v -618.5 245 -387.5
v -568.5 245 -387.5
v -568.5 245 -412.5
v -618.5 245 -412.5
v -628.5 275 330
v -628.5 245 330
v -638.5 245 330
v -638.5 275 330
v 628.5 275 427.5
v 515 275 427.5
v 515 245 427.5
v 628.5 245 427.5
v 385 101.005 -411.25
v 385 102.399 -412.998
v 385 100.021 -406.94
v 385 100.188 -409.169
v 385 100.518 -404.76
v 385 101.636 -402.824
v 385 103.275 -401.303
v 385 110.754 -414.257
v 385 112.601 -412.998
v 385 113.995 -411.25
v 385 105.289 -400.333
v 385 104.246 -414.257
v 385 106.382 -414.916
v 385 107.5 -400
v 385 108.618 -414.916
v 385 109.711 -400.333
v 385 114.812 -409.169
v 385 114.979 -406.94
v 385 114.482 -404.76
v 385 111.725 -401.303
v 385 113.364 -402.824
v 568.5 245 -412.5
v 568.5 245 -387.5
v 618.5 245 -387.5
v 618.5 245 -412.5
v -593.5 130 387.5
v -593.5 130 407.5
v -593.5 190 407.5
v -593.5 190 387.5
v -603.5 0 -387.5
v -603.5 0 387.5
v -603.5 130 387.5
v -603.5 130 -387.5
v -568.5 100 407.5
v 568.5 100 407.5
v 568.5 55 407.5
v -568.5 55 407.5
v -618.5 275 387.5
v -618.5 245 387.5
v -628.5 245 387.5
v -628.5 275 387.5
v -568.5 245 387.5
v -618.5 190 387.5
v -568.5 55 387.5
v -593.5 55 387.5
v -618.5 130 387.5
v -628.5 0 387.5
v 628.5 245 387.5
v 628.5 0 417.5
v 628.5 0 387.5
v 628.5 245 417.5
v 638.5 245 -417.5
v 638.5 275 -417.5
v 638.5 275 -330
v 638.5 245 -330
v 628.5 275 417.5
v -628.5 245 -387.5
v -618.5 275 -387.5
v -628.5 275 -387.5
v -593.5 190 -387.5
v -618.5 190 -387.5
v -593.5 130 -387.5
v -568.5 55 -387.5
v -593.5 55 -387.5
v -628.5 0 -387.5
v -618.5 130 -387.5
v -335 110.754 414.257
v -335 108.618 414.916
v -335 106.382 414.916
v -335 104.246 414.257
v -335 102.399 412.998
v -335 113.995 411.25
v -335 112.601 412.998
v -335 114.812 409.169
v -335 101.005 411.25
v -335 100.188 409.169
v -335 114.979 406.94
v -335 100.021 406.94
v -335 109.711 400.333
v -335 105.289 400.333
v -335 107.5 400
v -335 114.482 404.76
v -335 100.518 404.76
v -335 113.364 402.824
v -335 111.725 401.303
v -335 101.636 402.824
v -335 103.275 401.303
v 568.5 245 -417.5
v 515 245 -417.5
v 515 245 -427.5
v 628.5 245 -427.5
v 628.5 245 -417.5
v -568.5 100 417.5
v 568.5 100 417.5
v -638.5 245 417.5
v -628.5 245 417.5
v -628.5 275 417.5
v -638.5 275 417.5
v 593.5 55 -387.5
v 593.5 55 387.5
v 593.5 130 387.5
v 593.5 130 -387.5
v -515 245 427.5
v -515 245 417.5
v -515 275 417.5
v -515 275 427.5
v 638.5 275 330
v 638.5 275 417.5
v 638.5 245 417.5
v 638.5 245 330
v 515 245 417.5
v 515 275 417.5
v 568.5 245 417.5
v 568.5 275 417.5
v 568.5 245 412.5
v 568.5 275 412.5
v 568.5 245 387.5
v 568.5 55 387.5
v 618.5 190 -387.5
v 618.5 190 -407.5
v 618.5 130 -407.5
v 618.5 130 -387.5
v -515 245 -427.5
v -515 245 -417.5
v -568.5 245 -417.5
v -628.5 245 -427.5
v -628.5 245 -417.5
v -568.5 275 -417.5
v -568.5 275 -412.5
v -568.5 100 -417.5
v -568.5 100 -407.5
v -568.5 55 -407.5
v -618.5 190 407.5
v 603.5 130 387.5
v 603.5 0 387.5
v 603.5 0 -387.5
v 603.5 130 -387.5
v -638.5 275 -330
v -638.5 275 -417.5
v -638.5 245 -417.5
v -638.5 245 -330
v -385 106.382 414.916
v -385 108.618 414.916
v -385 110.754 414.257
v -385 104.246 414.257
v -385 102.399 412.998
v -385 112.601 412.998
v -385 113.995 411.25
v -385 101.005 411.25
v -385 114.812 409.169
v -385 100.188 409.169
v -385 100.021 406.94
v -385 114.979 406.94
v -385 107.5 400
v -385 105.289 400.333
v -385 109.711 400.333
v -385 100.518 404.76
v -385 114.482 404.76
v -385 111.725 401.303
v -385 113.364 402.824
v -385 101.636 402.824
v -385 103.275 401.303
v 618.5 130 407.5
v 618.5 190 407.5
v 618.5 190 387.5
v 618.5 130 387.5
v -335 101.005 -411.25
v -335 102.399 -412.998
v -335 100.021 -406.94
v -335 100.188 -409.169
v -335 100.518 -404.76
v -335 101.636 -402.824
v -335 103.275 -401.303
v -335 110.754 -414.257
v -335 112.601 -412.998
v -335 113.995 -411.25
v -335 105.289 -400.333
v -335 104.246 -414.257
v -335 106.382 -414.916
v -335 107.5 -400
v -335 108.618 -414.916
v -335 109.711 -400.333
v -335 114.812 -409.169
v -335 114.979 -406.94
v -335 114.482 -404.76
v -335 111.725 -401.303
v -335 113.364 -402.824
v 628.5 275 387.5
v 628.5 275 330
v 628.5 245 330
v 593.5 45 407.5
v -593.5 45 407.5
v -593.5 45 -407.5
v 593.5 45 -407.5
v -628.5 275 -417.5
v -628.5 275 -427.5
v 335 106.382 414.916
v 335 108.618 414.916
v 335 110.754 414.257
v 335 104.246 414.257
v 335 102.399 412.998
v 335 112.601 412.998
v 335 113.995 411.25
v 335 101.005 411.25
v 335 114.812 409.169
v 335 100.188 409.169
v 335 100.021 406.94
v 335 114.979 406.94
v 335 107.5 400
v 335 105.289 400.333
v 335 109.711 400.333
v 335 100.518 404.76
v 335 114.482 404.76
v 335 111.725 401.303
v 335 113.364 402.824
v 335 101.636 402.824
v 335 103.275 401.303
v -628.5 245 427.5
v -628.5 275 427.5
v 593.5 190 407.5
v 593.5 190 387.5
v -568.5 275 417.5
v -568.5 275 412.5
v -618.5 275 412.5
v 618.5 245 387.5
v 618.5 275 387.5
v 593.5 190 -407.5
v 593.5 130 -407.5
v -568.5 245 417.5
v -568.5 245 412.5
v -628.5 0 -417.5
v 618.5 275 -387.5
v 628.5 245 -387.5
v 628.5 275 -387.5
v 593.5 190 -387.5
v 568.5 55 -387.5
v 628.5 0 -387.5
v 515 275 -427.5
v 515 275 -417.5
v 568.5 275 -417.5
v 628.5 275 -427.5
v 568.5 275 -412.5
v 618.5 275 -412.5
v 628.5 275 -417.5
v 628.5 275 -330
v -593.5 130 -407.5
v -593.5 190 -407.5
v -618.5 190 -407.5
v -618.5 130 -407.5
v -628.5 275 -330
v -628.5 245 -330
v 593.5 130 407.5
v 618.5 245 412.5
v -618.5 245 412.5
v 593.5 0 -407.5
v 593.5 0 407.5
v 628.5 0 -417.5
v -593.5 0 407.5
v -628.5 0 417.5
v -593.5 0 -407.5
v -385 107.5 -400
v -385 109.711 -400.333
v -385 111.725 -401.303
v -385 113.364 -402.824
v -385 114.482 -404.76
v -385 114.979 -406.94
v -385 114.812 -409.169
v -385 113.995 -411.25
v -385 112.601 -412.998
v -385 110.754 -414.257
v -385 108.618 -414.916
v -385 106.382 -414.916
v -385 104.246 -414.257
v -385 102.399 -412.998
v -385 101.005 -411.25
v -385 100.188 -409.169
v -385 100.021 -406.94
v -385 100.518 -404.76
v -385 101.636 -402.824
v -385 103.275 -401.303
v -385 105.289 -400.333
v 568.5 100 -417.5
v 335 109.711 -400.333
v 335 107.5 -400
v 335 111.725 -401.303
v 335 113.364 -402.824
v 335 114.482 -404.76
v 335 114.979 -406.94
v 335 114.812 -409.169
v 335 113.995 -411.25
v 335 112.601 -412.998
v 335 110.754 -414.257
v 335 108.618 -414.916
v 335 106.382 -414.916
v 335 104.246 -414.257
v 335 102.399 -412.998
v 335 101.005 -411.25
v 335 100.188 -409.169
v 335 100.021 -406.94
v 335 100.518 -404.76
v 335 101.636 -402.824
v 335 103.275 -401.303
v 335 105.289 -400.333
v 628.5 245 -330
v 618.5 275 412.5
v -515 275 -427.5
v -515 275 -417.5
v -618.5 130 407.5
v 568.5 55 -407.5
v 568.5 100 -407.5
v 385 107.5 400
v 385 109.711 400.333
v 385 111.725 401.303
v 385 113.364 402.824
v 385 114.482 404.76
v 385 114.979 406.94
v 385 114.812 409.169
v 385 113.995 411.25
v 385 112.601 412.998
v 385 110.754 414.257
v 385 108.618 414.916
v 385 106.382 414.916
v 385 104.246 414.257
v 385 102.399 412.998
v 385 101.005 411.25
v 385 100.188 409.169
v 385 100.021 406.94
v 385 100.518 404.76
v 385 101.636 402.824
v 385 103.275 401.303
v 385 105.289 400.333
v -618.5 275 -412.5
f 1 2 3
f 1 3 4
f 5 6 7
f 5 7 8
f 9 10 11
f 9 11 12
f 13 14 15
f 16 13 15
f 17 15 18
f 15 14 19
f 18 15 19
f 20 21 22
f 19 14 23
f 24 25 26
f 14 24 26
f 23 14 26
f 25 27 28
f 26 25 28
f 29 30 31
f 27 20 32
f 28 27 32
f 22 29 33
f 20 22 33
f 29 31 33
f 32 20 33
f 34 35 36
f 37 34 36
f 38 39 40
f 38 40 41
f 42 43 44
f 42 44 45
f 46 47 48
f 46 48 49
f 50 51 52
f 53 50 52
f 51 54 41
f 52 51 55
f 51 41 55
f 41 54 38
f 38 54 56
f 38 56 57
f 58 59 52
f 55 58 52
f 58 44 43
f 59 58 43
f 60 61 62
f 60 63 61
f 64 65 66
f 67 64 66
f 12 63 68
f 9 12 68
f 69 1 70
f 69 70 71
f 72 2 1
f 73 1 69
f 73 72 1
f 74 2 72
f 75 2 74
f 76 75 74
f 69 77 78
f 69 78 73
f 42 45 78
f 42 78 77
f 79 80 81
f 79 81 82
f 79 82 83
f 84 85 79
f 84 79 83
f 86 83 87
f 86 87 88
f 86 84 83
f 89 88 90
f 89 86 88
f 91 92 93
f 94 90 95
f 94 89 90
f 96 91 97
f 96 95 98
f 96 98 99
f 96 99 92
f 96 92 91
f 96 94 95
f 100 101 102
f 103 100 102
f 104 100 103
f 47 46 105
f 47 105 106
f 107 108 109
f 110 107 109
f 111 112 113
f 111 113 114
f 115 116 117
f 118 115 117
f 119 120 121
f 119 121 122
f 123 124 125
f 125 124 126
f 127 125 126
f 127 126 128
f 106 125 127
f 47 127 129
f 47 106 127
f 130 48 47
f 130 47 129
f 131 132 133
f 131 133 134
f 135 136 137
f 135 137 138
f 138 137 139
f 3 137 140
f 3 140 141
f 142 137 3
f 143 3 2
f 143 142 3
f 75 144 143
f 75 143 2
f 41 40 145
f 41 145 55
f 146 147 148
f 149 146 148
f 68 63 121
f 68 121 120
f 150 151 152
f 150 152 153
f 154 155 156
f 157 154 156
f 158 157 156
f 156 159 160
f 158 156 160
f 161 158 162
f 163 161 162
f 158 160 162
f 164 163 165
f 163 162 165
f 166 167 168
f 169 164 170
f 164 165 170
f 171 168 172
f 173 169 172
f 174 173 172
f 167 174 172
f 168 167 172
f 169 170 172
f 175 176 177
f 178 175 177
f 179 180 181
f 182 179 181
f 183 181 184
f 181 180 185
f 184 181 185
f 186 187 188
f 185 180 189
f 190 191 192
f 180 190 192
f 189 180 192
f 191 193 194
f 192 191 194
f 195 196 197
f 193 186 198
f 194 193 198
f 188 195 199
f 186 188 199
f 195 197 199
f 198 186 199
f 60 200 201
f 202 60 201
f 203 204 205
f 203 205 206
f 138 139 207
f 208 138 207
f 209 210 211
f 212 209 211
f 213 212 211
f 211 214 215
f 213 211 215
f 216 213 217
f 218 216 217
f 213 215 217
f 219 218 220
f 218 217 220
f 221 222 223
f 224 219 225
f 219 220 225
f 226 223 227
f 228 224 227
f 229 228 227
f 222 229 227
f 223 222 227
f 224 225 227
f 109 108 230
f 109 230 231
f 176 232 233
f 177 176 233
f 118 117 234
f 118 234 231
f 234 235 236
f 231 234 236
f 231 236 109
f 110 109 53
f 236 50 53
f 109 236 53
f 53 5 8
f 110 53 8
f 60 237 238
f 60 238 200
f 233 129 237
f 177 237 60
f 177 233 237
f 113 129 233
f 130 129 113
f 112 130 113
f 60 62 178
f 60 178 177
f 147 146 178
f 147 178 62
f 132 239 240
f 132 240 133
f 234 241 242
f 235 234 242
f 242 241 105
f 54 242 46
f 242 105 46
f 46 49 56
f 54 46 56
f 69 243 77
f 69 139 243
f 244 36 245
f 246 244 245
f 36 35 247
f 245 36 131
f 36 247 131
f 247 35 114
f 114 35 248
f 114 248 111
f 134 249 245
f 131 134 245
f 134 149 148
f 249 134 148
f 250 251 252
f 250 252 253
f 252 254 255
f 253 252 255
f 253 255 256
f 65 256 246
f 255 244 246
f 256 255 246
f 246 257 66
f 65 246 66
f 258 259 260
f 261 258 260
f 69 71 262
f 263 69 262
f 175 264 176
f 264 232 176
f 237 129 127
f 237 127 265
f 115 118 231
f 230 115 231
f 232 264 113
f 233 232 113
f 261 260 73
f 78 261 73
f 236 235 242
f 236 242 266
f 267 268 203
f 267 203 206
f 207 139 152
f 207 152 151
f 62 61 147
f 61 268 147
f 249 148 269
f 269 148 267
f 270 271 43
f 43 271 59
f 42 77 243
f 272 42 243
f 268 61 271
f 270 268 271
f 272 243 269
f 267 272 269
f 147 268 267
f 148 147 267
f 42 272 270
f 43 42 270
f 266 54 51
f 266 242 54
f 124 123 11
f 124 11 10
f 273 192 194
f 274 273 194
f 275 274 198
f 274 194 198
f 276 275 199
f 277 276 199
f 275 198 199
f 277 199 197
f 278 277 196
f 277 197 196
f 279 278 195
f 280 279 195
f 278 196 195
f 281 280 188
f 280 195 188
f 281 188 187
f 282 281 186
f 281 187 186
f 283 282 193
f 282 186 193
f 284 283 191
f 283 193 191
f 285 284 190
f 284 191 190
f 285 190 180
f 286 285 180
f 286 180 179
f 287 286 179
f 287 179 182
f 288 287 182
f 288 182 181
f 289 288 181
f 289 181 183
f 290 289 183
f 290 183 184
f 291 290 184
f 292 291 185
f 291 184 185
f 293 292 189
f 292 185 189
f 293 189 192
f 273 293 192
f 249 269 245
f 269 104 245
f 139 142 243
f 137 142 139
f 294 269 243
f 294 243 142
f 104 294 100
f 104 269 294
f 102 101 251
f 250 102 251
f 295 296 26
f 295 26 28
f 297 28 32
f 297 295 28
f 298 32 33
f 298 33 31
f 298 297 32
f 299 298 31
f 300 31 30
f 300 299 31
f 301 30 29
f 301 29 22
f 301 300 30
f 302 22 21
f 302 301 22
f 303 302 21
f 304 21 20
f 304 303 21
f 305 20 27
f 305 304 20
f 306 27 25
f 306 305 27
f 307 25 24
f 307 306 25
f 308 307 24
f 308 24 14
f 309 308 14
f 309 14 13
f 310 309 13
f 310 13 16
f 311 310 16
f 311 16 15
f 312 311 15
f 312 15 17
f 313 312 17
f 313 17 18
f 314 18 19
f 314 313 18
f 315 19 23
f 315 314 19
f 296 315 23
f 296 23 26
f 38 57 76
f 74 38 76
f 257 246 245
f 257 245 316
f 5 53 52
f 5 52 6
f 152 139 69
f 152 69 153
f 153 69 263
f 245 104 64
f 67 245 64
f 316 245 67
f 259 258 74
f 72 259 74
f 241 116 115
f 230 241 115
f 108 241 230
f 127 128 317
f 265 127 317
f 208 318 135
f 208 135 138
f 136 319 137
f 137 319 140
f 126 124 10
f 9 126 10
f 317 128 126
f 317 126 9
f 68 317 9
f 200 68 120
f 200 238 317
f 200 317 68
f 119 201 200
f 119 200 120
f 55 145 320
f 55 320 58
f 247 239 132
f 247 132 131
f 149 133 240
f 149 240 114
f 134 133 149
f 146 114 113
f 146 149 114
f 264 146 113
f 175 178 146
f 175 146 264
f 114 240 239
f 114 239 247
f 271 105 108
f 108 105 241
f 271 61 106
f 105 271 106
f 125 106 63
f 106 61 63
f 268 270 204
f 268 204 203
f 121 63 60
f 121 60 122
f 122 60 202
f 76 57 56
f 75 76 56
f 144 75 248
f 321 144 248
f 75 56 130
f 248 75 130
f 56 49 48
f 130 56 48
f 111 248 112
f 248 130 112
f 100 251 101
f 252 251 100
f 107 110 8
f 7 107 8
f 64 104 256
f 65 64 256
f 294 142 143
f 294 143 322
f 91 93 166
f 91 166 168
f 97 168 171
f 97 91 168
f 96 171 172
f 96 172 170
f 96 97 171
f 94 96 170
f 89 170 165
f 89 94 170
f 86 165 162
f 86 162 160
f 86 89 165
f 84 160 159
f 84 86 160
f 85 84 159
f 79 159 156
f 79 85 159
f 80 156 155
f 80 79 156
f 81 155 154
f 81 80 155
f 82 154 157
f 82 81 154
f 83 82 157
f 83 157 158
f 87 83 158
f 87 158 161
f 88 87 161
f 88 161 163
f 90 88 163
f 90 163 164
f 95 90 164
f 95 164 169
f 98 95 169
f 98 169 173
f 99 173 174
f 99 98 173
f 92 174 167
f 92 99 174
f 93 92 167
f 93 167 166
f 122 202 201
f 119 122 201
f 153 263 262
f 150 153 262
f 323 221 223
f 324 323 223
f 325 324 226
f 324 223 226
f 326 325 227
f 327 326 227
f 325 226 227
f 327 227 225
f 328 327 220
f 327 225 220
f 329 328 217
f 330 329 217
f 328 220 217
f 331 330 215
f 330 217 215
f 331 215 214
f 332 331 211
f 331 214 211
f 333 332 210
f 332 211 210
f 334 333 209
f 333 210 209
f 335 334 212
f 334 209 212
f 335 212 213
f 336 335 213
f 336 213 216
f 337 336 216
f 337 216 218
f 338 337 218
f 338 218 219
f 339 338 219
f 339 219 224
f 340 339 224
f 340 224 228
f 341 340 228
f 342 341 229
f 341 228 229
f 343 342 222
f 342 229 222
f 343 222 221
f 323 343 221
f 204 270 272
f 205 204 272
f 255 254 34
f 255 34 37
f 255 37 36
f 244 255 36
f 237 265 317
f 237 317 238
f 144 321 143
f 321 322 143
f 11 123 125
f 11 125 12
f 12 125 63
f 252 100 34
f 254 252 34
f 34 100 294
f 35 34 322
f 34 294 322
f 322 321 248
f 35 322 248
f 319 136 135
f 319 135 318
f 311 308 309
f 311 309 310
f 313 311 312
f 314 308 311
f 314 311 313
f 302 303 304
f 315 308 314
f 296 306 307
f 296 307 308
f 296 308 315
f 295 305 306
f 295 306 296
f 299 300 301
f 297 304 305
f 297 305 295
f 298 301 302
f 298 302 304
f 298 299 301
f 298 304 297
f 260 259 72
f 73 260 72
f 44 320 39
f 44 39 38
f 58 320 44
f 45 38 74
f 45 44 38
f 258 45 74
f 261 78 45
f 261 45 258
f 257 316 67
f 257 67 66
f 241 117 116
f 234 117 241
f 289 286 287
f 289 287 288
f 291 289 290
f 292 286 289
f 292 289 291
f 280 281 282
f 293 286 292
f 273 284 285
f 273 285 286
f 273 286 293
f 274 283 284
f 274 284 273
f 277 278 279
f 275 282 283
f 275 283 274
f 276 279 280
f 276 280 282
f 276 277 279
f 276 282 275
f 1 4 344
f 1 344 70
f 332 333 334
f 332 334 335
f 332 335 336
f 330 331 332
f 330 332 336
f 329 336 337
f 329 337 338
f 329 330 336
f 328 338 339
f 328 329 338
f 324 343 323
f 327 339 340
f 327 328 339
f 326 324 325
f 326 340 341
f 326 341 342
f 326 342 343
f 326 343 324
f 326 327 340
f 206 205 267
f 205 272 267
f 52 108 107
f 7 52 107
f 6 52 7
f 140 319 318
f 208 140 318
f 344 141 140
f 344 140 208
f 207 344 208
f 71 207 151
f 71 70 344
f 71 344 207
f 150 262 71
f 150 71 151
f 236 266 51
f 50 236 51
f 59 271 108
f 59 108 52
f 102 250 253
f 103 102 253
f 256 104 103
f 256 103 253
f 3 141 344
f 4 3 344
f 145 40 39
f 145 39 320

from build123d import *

# Parameters (mm, degrees)
SCHIZZO1_W                    = 1207
SCHIZZO1_H                    = 835
ESTRUSIONE_ESTRUSIONE2_DEPTH  = 100
SVUOTA1_T                     = -10
ESTRUSIONE_ESTRUSIONE3_REACH  = 837
SCHIZZO6_W                    = 1207
SCHIZZO6_H                    = 10
SCHIZZO12_W                   = 10
SCHIZZO12_H                   = 835
ESTRUSIONE_ESTRUSIONE10_DEPTH = 30
SCHIZZO7_W                    = 60
SCHIZZO7_H                    = 275
ESTRUSIONE_ESTRUSIONE4_DEPTH  = 10
SCHIZZO8_W                    = 20
SCHIZZO8_H                    = 145
ESTRUSIONE_ESTRUSIONE5_DEPTH  = 10
SCHIZZO9_W                    = 5
SCHIZZO9_H                    = 30
ESTRUSIONE_ESTRUSIONE6_DEPTH  = 75
SCHIZZO10_W                   = 5
SCHIZZO10_H                   = 30
ESTRUSIONE_ESTRUSIONE7_DEPTH  = 65
SCHIZZO11_W                   = 5
SCHIZZO11_H                   = 20
ESTRUSIONE_ESTRUSIONE8_DEPTH  = 25
SCHIZZO8_3_W                  = 20
SCHIZZO8_3_H                  = 130
ESTRUSIONE_ESTRUSIONE9_DEPTH  = 25
SCHIZZO14_W                   = 87.5
SCHIZZO14_H                   = 30
ESTRUSIONE_ESTRUSIONE12_DEPTH = 10
SCHIZZO15_W                   = 50
SCHIZZO15_H                   = 5
TAGLIO_ESTRUSIONE1_DEPTH      = 30
SCHIZZO16_W                   = 20
SCHIZZO16_H                   = 20
ESTRUSIONE_ESTRUSIONE13_DEPTH = 190
SCHIZZO17_W                   = 30
SCHIZZO17_H                   = 20
ESTRUSIONE_ESTRUSIONE14_DEPTH = 50
SCHIZZO18_W                   = 113.5
SCHIZZO18_H                   = 30
ESTRUSIONE_ESTRUSIONE15_DEPTH = 10
SPECCHIA2_COPY_1_SKETCH_W     = 60
SPECCHIA2_COPY_1_SKETCH_H     = 275
SPECCHIA2_COPY_1_DEPTH        = 10
SPECCHIA2_COPY_2_SKETCH_W     = 20
SPECCHIA2_COPY_2_SKETCH_H     = 145
SPECCHIA2_COPY_2_DEPTH        = 10
SPECCHIA2_COPY_3_SKETCH_W     = 5
SPECCHIA2_COPY_3_SKETCH_H     = 30
SPECCHIA2_COPY_3_DEPTH        = 75
SPECCHIA2_COPY_4_SKETCH_W     = 5
SPECCHIA2_COPY_4_SKETCH_H     = 30
SPECCHIA2_COPY_4_DEPTH        = 65
SPECCHIA2_COPY_5_SKETCH_W     = 5
SPECCHIA2_COPY_5_SKETCH_H     = 20
SPECCHIA2_COPY_5_DEPTH        = 25
SPECCHIA2_COPY_6_SKETCH_W     = 20
SPECCHIA2_COPY_6_SKETCH_H     = 130
SPECCHIA2_COPY_6_DEPTH        = 25
SPECCHIA2_COPY_7_SKETCH_W     = 87.5
SPECCHIA2_COPY_7_SKETCH_H     = 30
SPECCHIA2_COPY_7_DEPTH        = 10
SPECCHIA2_COPY_8_SKETCH_W     = 50
SPECCHIA2_COPY_8_SKETCH_H     = 5
SPECCHIA2_COPY_8_DEPTH        = 30
SPECCHIA2_COPY_9_SKETCH_W     = 20
SPECCHIA2_COPY_9_SKETCH_H     = 20
SPECCHIA2_COPY_9_DEPTH        = 190
SPECCHIA2_COPY_10_SKETCH_W    = 30
SPECCHIA2_COPY_10_SKETCH_H    = 20
SPECCHIA2_COPY_10_DEPTH       = 50
SPECCHIA2_COPY_11_SKETCH_W    = 113.5
SPECCHIA2_COPY_11_SKETCH_H    = 30
SPECCHIA2_COPY_11_DEPTH       = 10
SPECCHIA2_COPY_12_SKETCH_W    = 20
SPECCHIA2_COPY_12_SKETCH_H    = 130
SPECCHIA2_COPY_12_DEPTH       = 25
SPECCHIA2_COPY_13_SKETCH_W    = 30
SPECCHIA2_COPY_13_SKETCH_H    = 20
SPECCHIA2_COPY_13_DEPTH       = 50
ESTRUSIONE_ESTRUSIONE11_START = 233.5
SCHIZZO13_R                   = 7.5
ESTRUSIONE_ESTRUSIONE11_DEPTH = 50


with BuildPart() as part:
    # Schizzo1 → Estrusione-Estrusione2 (new body)
    with BuildSketch(Plane(origin=(0, 0, 0), x_dir=(1, 0, 0), z_dir=(0, 1, 0))):
        Rectangle(SCHIZZO1_W, SCHIZZO1_H)
    extrude(amount=ESTRUSIONE_ESTRUSIONE2_DEPTH)

    # Svuota1
    svuota1_openings = [part.faces().sort_by_distance(p)[0] for p in [
        (0, 100, 0),
        (0, 0, 0),
    ]]
    offset(amount=SVUOTA1_T, openings=svuota1_openings, kind=Kind.INTERSECTION)

    # Schizzo6 → Estrusione-Estrusione3 (add, up to next)
    with BuildSketch(Plane.XY.offset(417.5), mode=Mode.PRIVATE) as estrusione_estrusione3_sk1:
        with Locations((0, 50)):
            Rectangle(SCHIZZO6_W, SCHIZZO6_H)
    estrusione_estrusione3_tool1 = extrude(estrusione_estrusione3_sk1.sketch, amount=-ESTRUSIONE_ESTRUSIONE3_REACH, mode=Mode.PRIVATE) - part.part
    add(estrusione_estrusione3_tool1.solids().sort_by_distance((0, 50, 417.5))[0])

    # Schizzo12 → Estrusione-Estrusione10 (add)
    with BuildSketch(Plane(origin=(0, 100, 0), x_dir=(1, 0, 0), z_dir=(0, 1, 0))):
        with Locations((598.5, 0)):
            Rectangle(SCHIZZO12_W, SCHIZZO12_H)
        with Locations((-598.5, 0)):
            Rectangle(SCHIZZO12_W, SCHIZZO12_H)
    extrude(amount=ESTRUSIONE_ESTRUSIONE10_DEPTH)

    # Schizzo7 → Estrusione-Estrusione4 (add)
    with BuildSketch(Plane.XY.offset(417.5)):
        with Locations((598.5, 137.5)):
            Rectangle(SCHIZZO7_W, SCHIZZO7_H)
    estrusione_estrusione4 = extrude(amount=-ESTRUSIONE_ESTRUSIONE4_DEPTH)

    # Schizzo8 → Estrusione-Estrusione5 (add)
    with BuildSketch(Plane(origin=(628.5, 0, 0), x_dir=(0, 0, -1), z_dir=(1, 0, 0))):
        with Locations((-397.5, 202.5)):
            Rectangle(SCHIZZO8_W, SCHIZZO8_H)
    estrusione_estrusione5 = extrude(amount=-ESTRUSIONE_ESTRUSIONE5_DEPTH)

    # Schizzo9 → Estrusione-Estrusione6 (add)
    with BuildSketch(Plane(origin=(0, 130, 0), x_dir=(1, 0, 0), z_dir=(0, 1, 0))):
        with Locations((591, -402.5)):
            Rectangle(SCHIZZO9_W, SCHIZZO9_H)
    estrusione_estrusione6 = extrude(amount=-ESTRUSIONE_ESTRUSIONE6_DEPTH)

    # Schizzo10 → Estrusione-Estrusione7 (add)
    with BuildSketch(Plane(origin=(0, 130, 0), x_dir=(1, 0, 0), z_dir=(0, 1, 0))):
        with Locations((591, -402.5)):
            Rectangle(SCHIZZO10_W, SCHIZZO10_H)
    estrusione_estrusione7 = extrude(amount=ESTRUSIONE_ESTRUSIONE7_DEPTH)

    # Schizzo11 → Estrusione-Estrusione8 (add)
    with BuildSketch(Plane(origin=(593.5, -365, 0), x_dir=(0, 1, 0), z_dir=(-1, 0, 0))):
        with Locations((557.5, -397.5)):
            Rectangle(SCHIZZO11_W, SCHIZZO11_H)
    estrusione_estrusione8 = extrude(amount=-ESTRUSIONE_ESTRUSIONE8_DEPTH)

    # Schizzo8_3 → Estrusione-Estrusione9 (add)
    with BuildSketch(Plane(origin=(628.5, 0, 0), x_dir=(0, 0, -1), z_dir=(1, 0, 0))):
        with Locations((-397.5, 65)):
            Rectangle(SCHIZZO8_3_W, SCHIZZO8_3_H)
    estrusione_estrusione9 = extrude(amount=-ESTRUSIONE_ESTRUSIONE9_DEPTH)

    # Schizzo14 → Estrusione-Estrusione12 (add)
    with BuildSketch(Plane(origin=(628.5, 0, 0), x_dir=(0, 0, -1), z_dir=(1, 0, 0))):
        with Locations((-373.75, 260)):
            Rectangle(SCHIZZO14_W, SCHIZZO14_H)
    estrusione_estrusione12 = extrude(amount=ESTRUSIONE_ESTRUSIONE12_DEPTH)

    # Schizzo15 → Taglio-Estrusione1 (cut)
    with BuildSketch(Plane(origin=(0, 275, 0), x_dir=(1, 0, 0), z_dir=(0, 1, 0))):
        with Locations((593.5, -410)):
            Rectangle(SCHIZZO15_W, SCHIZZO15_H)
    taglio_estrusione1 = extrude(amount=-TAGLIO_ESTRUSIONE1_DEPTH, mode=Mode.SUBTRACT)

    # Schizzo16 → Estrusione-Estrusione13 (add)
    with BuildSketch(Plane(origin=(0, 55, 0), x_dir=(1, 0, 0), z_dir=(0, 1, 0))):
        with Locations((578.5, -397.5)):
            Rectangle(SCHIZZO16_W, SCHIZZO16_H)
    estrusione_estrusione13 = extrude(amount=ESTRUSIONE_ESTRUSIONE13_DEPTH)

    # Schizzo17 → Estrusione-Estrusione14 (add)
    with BuildSketch(Plane(origin=(0, 195, 0), x_dir=(1, 0, 0), z_dir=(0, 1, 0))):
        with Locations((603.5, -397.5)):
            Rectangle(SCHIZZO17_W, SCHIZZO17_H)
    estrusione_estrusione14 = extrude(amount=ESTRUSIONE_ESTRUSIONE14_DEPTH)

    # Schizzo18 → Estrusione-Estrusione15 (add)
    with BuildSketch(Plane.XY.offset(417.5)):
        with Locations((571.75, 260)):
            Rectangle(SCHIZZO18_W, SCHIZZO18_H)
    estrusione_estrusione15 = extrude(amount=ESTRUSIONE_ESTRUSIONE15_DEPTH)

    # Specchia1: Estrusione-Estrusione4, Estrusione-Estrusione5, Estrusione-Estrusione6, Estrusione-Estrusione7, Estrusione-Estrusione8, Estrusione-Estrusione9, Estrusione-Estrusione12, Taglio-Estrusione1, Estrusione-Estrusione13, Estrusione-Estrusione14, Estrusione-Estrusione15 across plane
    add(estrusione_estrusione4.mirror(Plane.XY))
    add(estrusione_estrusione5.mirror(Plane.XY))
    add(estrusione_estrusione6.mirror(Plane.XY))
    add(estrusione_estrusione7.mirror(Plane.XY))
    add(estrusione_estrusione8.mirror(Plane.XY))
    add(estrusione_estrusione9.mirror(Plane.XY))
    add(estrusione_estrusione12.mirror(Plane.XY))
    add(taglio_estrusione1.mirror(Plane.XY), mode=Mode.SUBTRACT)
    add(estrusione_estrusione13.mirror(Plane.XY))
    add(estrusione_estrusione14.mirror(Plane.XY))
    add(estrusione_estrusione15.mirror(Plane.XY))

    # Specchia2: Estrusione-Estrusione4, Estrusione-Estrusione5, Estrusione-Estrusione6, Estrusione-Estrusione7, Estrusione-Estrusione8, Estrusione-Estrusione12, Taglio-Estrusione1, Estrusione-Estrusione13, Estrusione-Estrusione15 across plane
    add(estrusione_estrusione4.mirror(Plane(origin=(0, 0, 0), x_dir=(0, 0, 1), z_dir=(1, 0, 0))))
    add(estrusione_estrusione5.mirror(Plane(origin=(0, 0, 0), x_dir=(0, 0, 1), z_dir=(1, 0, 0))))
    add(estrusione_estrusione6.mirror(Plane(origin=(0, 0, 0), x_dir=(0, 0, 1), z_dir=(1, 0, 0))))
    add(estrusione_estrusione7.mirror(Plane(origin=(0, 0, 0), x_dir=(0, 0, 1), z_dir=(1, 0, 0))))
    add(estrusione_estrusione8.mirror(Plane(origin=(0, 0, 0), x_dir=(0, 0, 1), z_dir=(1, 0, 0))))
    add(estrusione_estrusione12.mirror(Plane(origin=(0, 0, 0), x_dir=(0, 0, 1), z_dir=(1, 0, 0))))
    add(taglio_estrusione1.mirror(Plane(origin=(0, 0, 0), x_dir=(0, 0, 1), z_dir=(1, 0, 0))), mode=Mode.SUBTRACT)
    add(estrusione_estrusione13.mirror(Plane(origin=(0, 0, 0), x_dir=(0, 0, 1), z_dir=(1, 0, 0))))
    add(estrusione_estrusione15.mirror(Plane(origin=(0, 0, 0), x_dir=(0, 0, 1), z_dir=(1, 0, 0))))

    # Specchia2 copy 1 sketch → Specchia2 copy 1 (add)
    with BuildSketch(Plane(origin=(0, 0, -417.5), x_dir=(-1, 0, 0), z_dir=(0, 0, -1))):
        with Locations((598.5, 137.5)):
            Rectangle(SPECCHIA2_COPY_1_SKETCH_W, SPECCHIA2_COPY_1_SKETCH_H)
    extrude(amount=-SPECCHIA2_COPY_1_DEPTH)

    # Specchia2 copy 2 sketch → Specchia2 copy 2 (add)
    with BuildSketch(Plane.ZY.offset(628.5)):
        with Locations((-397.5, 202.5)):
            Rectangle(SPECCHIA2_COPY_2_SKETCH_W, SPECCHIA2_COPY_2_SKETCH_H)
    extrude(amount=-SPECCHIA2_COPY_2_DEPTH)

    # Specchia2 copy 3 sketch → Specchia2 copy 3 (add)
    with BuildSketch(Plane(origin=(0, 130, 0), x_dir=(-1, 0, 0), z_dir=(0, 1, 0))):
        with Locations((591, -402.5)):
            Rectangle(SPECCHIA2_COPY_3_SKETCH_W, SPECCHIA2_COPY_3_SKETCH_H)
    extrude(amount=-SPECCHIA2_COPY_3_DEPTH)

    # Specchia2 copy 4 sketch → Specchia2 copy 4 (add)
    with BuildSketch(Plane(origin=(0, 130, 0), x_dir=(-1, 0, 0), z_dir=(0, 1, 0))):
        with Locations((591, -402.5)):
            Rectangle(SPECCHIA2_COPY_4_SKETCH_W, SPECCHIA2_COPY_4_SKETCH_H)
    extrude(amount=SPECCHIA2_COPY_4_DEPTH)

    # Specchia2 copy 5 sketch → Specchia2 copy 5 (add)
    with BuildSketch(Plane(origin=(-593.5, -365, 0), x_dir=(0, 1, 0), z_dir=(1, 0, 0))):
        with Locations((557.5, -397.5)):
            Rectangle(SPECCHIA2_COPY_5_SKETCH_W, SPECCHIA2_COPY_5_SKETCH_H)
    extrude(amount=-SPECCHIA2_COPY_5_DEPTH)

    # Specchia2 copy 6 sketch → Specchia2 copy 6 (add)
    with BuildSketch(Plane.ZY.offset(628.5)):
        with Locations((-397.5, 65)):
            Rectangle(SPECCHIA2_COPY_6_SKETCH_W, SPECCHIA2_COPY_6_SKETCH_H)
    extrude(amount=-SPECCHIA2_COPY_6_DEPTH)

    # Specchia2 copy 7 sketch → Specchia2 copy 7 (add)
    with BuildSketch(Plane.ZY.offset(628.5)):
        with Locations((-373.75, 260)):
            Rectangle(SPECCHIA2_COPY_7_SKETCH_W, SPECCHIA2_COPY_7_SKETCH_H)
    extrude(amount=SPECCHIA2_COPY_7_DEPTH)

    # Specchia2 copy 8 sketch → Specchia2 copy 8 (cut)
    with BuildSketch(Plane(origin=(0, 275, 0), x_dir=(-1, 0, 0), z_dir=(0, 1, 0))):
        with Locations((593.5, -410)):
            Rectangle(SPECCHIA2_COPY_8_SKETCH_W, SPECCHIA2_COPY_8_SKETCH_H)
    extrude(amount=-SPECCHIA2_COPY_8_DEPTH, mode=Mode.SUBTRACT)

    # Specchia2 copy 9 sketch → Specchia2 copy 9 (add)
    with BuildSketch(Plane(origin=(0, 55, 0), x_dir=(-1, 0, 0), z_dir=(0, 1, 0))):
        with Locations((578.5, -397.5)):
            Rectangle(SPECCHIA2_COPY_9_SKETCH_W, SPECCHIA2_COPY_9_SKETCH_H)
    extrude(amount=SPECCHIA2_COPY_9_DEPTH)

    # Specchia2 copy 10 sketch → Specchia2 copy 10 (add)
    with BuildSketch(Plane(origin=(0, 195, 0), x_dir=(-1, 0, 0), z_dir=(0, 1, 0))):
        with Locations((603.5, -397.5)):
            Rectangle(SPECCHIA2_COPY_10_SKETCH_W, SPECCHIA2_COPY_10_SKETCH_H)
    extrude(amount=SPECCHIA2_COPY_10_DEPTH)

    # Specchia2 copy 11 sketch → Specchia2 copy 11 (add)
    with BuildSketch(Plane(origin=(0, 0, -417.5), x_dir=(-1, 0, 0), z_dir=(0, 0, -1))):
        with Locations((571.75, 260)):
            Rectangle(SPECCHIA2_COPY_11_SKETCH_W, SPECCHIA2_COPY_11_SKETCH_H)
    extrude(amount=SPECCHIA2_COPY_11_DEPTH)

    # Specchia2 copy 12 sketch → Specchia2 copy 12 (add)
    with BuildSketch(Plane(origin=(-628.5, 0, 0), x_dir=(0, 0, -1), z_dir=(-1, 0, 0))):
        with Locations((-397.5, -65)):
            Rectangle(SPECCHIA2_COPY_12_SKETCH_W, SPECCHIA2_COPY_12_SKETCH_H)
    extrude(amount=-SPECCHIA2_COPY_12_DEPTH)

    # Specchia2 copy 13 sketch → Specchia2 copy 13 (add)
    with BuildSketch(Plane(origin=(0, 195, 0), x_dir=(-1, 0, 0), z_dir=(0, 1, 0))):
        with Locations((603.5, 397.5)):
            Rectangle(SPECCHIA2_COPY_13_SKETCH_W, SPECCHIA2_COPY_13_SKETCH_H)
    extrude(amount=SPECCHIA2_COPY_13_DEPTH)


with BuildPart() as body_2:
    # Schizzo13 → Estrusione-Estrusione11 (new body)
    with BuildSketch(Plane.ZY.offset(-568.5).offset(ESTRUSIONE_ESTRUSIONE11_START)):
        with Locations((-407.5, 107.5)):
            Circle(SCHIZZO13_R)
    extrude(amount=-ESTRUSIONE_ESTRUSIONE11_DEPTH)


with BuildPart() as body_3:
    # Specchia3: mirrored copy
    add(body_2.part.mirror(Plane(origin=(0, 0, 0), x_dir=(0, 0, 1), z_dir=(1, 0, 0))))


with BuildPart() as body_4:
    # Specchia4: mirrored copy
    add(body_3.part.mirror(Plane.XY))


with BuildPart() as body_5:
    # Specchia4 2: mirrored copy
    add(body_2.part.mirror(Plane.XY))


solid = Compound([part.part, body_2.part, body_3.part, body_4.part, body_5.part])
